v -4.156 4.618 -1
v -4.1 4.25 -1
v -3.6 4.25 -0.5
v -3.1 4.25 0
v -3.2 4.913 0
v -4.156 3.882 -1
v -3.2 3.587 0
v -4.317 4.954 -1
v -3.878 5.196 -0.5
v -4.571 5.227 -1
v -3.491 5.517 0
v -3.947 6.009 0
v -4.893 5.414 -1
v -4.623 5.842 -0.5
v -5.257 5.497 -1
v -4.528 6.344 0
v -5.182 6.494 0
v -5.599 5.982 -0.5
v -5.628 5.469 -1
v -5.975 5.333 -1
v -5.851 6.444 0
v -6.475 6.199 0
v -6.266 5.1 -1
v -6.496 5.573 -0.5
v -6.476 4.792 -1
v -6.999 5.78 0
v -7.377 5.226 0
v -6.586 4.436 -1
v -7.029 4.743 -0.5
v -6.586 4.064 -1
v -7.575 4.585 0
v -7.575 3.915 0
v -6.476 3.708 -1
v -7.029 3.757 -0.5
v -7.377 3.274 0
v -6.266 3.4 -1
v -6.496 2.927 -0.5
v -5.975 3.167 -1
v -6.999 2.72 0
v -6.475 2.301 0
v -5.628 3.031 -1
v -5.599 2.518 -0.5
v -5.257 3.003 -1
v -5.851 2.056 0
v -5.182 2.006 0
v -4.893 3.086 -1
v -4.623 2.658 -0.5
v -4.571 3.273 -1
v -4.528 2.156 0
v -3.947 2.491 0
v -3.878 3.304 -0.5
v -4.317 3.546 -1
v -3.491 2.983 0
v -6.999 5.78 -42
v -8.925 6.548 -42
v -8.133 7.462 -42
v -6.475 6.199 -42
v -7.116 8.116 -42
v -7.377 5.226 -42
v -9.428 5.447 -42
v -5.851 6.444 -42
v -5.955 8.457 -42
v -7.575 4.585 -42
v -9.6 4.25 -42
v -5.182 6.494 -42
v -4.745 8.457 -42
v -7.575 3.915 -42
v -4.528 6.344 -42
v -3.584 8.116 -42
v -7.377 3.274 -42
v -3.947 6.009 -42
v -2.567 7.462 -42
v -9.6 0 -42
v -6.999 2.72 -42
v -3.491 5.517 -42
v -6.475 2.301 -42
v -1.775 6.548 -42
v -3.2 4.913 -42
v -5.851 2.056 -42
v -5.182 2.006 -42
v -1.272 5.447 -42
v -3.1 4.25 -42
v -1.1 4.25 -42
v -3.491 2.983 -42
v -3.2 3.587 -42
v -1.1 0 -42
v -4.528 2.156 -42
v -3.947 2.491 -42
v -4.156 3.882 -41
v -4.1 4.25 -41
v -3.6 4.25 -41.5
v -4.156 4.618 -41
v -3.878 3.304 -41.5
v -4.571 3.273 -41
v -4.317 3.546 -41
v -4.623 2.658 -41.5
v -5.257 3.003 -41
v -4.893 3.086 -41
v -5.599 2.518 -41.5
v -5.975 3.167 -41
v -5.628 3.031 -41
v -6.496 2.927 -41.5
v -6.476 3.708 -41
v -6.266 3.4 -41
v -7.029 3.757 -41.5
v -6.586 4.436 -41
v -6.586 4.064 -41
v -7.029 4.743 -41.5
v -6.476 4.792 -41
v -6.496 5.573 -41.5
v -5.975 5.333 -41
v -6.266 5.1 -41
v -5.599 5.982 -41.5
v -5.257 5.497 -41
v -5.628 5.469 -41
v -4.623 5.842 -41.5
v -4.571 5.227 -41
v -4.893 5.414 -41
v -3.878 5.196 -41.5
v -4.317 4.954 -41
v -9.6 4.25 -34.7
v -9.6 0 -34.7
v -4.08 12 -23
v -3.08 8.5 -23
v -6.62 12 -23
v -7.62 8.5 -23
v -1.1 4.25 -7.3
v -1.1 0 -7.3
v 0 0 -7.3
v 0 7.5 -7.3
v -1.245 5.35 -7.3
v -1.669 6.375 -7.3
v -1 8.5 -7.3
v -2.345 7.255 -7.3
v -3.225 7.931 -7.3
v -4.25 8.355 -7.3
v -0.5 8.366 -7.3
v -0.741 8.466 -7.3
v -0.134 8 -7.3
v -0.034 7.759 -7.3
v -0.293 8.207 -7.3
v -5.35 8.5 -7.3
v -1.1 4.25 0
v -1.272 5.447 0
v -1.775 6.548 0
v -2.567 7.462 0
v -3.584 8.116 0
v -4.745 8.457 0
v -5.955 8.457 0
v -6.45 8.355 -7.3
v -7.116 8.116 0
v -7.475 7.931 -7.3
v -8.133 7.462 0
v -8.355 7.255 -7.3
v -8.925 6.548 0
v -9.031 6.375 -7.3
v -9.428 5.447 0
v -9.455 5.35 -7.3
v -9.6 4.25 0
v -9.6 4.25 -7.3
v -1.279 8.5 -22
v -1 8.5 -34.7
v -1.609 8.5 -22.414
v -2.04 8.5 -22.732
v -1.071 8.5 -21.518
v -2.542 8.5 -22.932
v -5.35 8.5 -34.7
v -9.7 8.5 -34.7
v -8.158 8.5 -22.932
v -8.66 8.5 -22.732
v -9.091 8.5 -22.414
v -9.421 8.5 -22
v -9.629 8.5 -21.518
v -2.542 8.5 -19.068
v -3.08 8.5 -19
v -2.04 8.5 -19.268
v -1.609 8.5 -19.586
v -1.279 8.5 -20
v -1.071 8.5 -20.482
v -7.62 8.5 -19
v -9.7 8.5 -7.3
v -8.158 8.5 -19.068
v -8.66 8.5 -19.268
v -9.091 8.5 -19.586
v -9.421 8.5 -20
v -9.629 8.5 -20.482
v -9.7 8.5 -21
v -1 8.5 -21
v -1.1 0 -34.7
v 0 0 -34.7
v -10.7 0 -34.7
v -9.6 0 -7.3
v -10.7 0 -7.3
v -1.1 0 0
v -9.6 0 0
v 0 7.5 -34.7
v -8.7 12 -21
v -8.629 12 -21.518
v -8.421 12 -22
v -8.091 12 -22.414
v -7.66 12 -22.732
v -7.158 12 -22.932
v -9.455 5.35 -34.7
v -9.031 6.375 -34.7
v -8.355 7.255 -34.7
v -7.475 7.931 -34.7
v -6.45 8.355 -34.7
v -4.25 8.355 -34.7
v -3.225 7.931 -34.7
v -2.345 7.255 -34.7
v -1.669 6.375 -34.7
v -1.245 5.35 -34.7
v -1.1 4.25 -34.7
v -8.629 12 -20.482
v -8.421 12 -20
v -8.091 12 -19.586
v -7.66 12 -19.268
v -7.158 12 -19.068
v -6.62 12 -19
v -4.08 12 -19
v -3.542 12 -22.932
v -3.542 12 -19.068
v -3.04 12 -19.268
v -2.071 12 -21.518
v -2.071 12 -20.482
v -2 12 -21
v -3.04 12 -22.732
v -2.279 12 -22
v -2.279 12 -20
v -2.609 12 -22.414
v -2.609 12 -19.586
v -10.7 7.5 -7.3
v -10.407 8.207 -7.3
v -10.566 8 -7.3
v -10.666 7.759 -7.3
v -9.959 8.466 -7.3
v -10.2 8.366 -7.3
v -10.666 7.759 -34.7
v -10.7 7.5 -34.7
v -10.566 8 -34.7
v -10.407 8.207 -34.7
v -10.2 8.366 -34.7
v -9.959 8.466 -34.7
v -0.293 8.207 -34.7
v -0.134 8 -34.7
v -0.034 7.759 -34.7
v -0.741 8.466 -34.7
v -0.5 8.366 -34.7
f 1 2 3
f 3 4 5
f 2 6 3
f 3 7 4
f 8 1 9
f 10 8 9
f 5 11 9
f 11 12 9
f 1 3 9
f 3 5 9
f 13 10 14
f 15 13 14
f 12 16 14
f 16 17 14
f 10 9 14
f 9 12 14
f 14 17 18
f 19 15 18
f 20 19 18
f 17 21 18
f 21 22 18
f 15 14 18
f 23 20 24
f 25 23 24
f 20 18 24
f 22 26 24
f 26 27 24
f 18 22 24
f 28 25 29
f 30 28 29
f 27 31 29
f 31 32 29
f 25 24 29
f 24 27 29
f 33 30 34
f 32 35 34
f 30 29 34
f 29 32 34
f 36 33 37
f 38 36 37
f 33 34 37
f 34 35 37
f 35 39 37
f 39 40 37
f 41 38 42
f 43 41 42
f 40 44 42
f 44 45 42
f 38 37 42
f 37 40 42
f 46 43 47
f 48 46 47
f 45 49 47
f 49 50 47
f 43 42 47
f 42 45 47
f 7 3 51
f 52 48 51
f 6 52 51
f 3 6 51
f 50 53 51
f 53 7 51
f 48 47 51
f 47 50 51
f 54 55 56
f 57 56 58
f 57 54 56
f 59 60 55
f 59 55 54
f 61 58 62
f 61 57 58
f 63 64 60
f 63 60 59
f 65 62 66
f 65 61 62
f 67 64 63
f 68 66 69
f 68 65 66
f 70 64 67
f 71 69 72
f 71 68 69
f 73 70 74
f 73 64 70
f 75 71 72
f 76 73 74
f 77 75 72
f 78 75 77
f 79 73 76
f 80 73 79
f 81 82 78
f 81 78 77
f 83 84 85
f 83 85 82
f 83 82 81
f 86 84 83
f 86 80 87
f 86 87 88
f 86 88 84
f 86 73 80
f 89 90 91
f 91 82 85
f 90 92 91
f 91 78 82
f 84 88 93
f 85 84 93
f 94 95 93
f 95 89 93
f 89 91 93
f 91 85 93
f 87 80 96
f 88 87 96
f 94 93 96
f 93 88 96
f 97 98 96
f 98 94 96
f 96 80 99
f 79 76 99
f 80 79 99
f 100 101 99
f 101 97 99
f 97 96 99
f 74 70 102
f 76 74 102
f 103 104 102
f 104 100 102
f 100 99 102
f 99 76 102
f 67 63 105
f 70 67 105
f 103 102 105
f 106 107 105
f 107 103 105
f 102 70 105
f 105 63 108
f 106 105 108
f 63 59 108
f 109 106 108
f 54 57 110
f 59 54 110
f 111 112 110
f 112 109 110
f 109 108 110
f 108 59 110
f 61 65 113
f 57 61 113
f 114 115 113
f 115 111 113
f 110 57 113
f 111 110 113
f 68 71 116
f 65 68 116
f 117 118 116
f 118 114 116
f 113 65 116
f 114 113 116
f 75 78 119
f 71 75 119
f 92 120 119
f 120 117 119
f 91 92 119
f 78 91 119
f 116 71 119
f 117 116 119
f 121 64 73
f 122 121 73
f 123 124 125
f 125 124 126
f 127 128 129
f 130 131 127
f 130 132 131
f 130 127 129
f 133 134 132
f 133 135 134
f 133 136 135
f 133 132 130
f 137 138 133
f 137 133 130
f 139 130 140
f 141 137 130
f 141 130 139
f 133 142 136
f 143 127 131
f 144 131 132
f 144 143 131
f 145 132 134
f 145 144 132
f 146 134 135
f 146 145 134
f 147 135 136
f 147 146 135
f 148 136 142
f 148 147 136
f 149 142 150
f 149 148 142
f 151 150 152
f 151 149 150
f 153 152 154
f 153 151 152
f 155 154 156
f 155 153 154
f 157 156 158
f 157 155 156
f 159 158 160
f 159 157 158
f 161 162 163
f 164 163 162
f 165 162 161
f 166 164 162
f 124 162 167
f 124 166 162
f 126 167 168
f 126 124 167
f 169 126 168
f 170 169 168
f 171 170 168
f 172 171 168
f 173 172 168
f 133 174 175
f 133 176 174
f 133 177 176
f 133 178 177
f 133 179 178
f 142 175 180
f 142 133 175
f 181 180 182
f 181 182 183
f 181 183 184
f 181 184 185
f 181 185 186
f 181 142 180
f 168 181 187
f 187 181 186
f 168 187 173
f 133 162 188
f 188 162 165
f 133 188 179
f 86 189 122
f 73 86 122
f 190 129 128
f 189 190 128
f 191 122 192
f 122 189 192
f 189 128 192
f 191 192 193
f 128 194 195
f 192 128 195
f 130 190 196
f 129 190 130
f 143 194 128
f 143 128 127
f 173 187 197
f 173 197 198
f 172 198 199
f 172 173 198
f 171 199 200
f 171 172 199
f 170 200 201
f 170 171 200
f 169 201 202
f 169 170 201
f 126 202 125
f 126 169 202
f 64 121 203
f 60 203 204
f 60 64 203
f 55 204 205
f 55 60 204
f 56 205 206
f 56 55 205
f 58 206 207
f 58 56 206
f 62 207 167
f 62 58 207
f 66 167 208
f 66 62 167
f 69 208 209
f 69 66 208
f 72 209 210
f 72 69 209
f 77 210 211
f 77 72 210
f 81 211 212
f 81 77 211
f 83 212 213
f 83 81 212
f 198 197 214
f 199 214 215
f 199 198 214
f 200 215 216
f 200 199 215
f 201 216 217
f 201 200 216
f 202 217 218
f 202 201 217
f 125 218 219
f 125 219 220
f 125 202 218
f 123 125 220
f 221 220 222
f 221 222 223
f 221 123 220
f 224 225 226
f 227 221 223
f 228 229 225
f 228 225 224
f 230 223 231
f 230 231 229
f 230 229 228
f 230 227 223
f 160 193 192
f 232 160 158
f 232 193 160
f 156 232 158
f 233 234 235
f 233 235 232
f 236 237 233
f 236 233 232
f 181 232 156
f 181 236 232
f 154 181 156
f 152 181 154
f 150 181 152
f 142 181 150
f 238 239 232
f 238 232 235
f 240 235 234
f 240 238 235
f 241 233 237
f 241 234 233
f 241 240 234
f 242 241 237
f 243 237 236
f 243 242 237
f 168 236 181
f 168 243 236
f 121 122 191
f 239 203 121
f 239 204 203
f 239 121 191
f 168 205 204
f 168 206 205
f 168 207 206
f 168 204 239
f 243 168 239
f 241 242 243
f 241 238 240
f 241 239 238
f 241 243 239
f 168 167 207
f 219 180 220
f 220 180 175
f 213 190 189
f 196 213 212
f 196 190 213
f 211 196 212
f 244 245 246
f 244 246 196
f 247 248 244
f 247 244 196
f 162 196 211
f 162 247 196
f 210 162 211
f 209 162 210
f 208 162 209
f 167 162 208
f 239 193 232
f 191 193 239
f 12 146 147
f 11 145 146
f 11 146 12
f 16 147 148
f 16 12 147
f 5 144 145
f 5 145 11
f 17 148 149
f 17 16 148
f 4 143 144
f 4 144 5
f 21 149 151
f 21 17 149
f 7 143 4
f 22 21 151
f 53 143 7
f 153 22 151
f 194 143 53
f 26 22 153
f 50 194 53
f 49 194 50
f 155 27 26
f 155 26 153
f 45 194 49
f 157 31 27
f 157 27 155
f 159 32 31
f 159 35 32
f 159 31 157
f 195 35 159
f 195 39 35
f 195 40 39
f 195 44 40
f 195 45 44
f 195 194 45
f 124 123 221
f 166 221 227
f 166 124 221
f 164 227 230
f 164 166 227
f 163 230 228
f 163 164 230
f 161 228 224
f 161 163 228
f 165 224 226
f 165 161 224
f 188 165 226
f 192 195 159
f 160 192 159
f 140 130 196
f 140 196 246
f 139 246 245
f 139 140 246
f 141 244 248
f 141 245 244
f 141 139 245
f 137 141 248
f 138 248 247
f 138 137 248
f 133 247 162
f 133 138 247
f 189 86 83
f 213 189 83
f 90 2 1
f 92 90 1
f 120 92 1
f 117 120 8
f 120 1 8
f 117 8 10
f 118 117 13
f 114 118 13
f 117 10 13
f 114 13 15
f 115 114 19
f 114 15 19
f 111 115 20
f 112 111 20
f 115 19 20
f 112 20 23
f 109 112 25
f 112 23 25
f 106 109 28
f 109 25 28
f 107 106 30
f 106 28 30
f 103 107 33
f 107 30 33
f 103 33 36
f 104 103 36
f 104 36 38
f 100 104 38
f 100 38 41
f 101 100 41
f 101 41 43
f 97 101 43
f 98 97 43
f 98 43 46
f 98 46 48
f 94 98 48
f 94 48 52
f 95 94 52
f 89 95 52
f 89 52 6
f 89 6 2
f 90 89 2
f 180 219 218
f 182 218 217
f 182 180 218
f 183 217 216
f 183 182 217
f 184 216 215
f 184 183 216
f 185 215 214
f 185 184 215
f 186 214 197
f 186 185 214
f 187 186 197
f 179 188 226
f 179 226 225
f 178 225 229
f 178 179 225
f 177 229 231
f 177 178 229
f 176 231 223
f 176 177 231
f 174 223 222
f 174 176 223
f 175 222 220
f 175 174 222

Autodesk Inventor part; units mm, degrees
ref_plane "YZ Plane" through (0, 0, 0) normal (1, 0, 0) x (0, 1, 0)
ref_plane "XZ Plane" through (0, 0, 0) normal (0, 1, 0) x (-1, 0, 0)
ref_plane "XY Plane" through (0, 0, 0) normal (0, 0, 1) x (1, 0, 0)
sketch "Sketch1" plane through (0, 0, 0) normal (0, 1, 0) x (-1, 0, 0)
  line L0 (0, 0) -> (10.7, 0)
  line L1 (10.7, 0) -> (10.7, -42)
  line L2 (10.7, -42) -> (0, -42)
  line L3 (0, -42) -> (0, 0)
  dimension "p" = 10.7
  dimension "d1" = 42
extrude "Extrusion1" add sketch "Sketch1" along normal blind 8.5
sketch "Sketch2" plane through (-10.7, 0, 0) normal (0, 0, 1) x (1, 0, 0)
  circle A0 centre (5.35, 4.25) radius 1.25
  line L0 (0, 8.5) -> (10.7, 8.5) projected
  line L1 (0, 0) -> (0, 8.5) projected
  point P0 (10.7, 0)
  dimension "d4" = 2.5
  dimension "d5" = 4.25
  dimension "d6" = 5.35
extrude "Extrusion2" cut sketch "Sketch2" against normal through all
sketch "Sketch3" plane through (-10.7, 0, 0) normal (0, 0, 1) x (1, 0, 0)
  circle A0 centre (5.35, 4.25) radius 1.25 projected
  arc A1 (9.6, 4.25) -> (1.1, 4.25) centre (5.35, 4.25) ccw
  line L0 (10.7, 8.5) -> (0, 8.5) projected
  line L1 (0, 8.5) -> (10.7, 8.5)
  line L2 (10.7, 0) -> (10.7, 8.5) projected
  line L3 (10.7, 8.5) -> (10.7, 0)
  line L4 (0, 0) -> (10.7, 0) projected
  line L5 (10.7, 0) -> (0, 0)
  line L6 (0, 0) -> (0, 8.5) projected
  line L7 (0, 0) -> (0, 8.5)
  line L8 (10.7, 0) -> (0, 0) projected
  line L9 (5.35, 0) -> (1.1, 0)
  line L10 (1.1, 0) -> (1.1, 4.25)
  line L11 (5.35, 0) -> (9.6, 0)
  line L12 (9.6, 0) -> (9.6, 4.25)
  dimension "d35" = 4.25
  dimension "d36" = 4.25
  dimension "d37" = 4.25
extrude "Extrusion3" cut sketch "Sketch3" against normal blind 7.3 contours A1 L0 L2 L4 L12 | A1 L10 L4 L6 L0
sketch "Sketch4" plane through (0, 0, -42) normal (0, 0, -1) x (-1, 0, 0)
  circle A0 centre (5.35, 4.25) radius 1.25 projected
  arc A1 (9.6, 4.25) -> (1.1, 4.25) centre (5.35, 4.25) ccw
  line L0 (0, 8.5) -> (10.7, 8.5) projected
  line L1 (10.7, 0) -> (0, 0) projected
  line L2 (0, 8.5) -> (0, 0)
  line L3 (0, 0) -> (10.7, 0)
  line L4 (10.7, 0) -> (10.7, 8.5)
  line L5 (10.7, 8.5) -> (0, 8.5)
  line L6 (1.1, 0) -> (1.1, 4.25) projected
  line L7 (1.1, 4.25) -> (1.1, 0)
  line L8 (9.6, 4.25) -> (9.6, 0) projected
  line L9 (1.1, 0) -> (9.6, 0) projected
  line L10 (9.6, 4.25) -> (9.6, 0)
extrude "Extrusion4" cut sketch "Sketch4" against normal blind 7.3 contours A1 L0 L4 L1 L8 | A1 L6 L1 L2 L0
sketch "Sketch5" plane through (0, 8.5, 0) normal (0, 1, 0) x (1, 0, 0)
  line L0 (-10.7, 7.3) -> (-10.7, 34.7) projected
  line L1 (0, 34.7) -> (0, 7.3) projected
  line L2 (-1, 23) -> (-9.7, 23)
  line L3 (-9.7, 19) -> (-1, 19)
  line L4 (-9.7, 19) -> (-9.7, 23)
  line L5 (-1, 19) -> (-1, 23)
  point P0 (0, 0)
  dimension "d19" = 4
  dimension "d20" = 4
  dimension "d21" = 8.7
  dimension "d22" = 1
  dimension "d23" = 19
extrude "Extrusion5" add sketch "Sketch5" along normal blind 3.5
sketch "Sketch6" plane through (-1, 8.5, -23) normal (0, 0, -1) x (-1, 0, 0)
  line L0 (8.7, 3.5) -> (0, 3.5) projected
  line L1 (8.7, 3.5) -> (7.7, 3.5)
  line L2 (0, 0) -> (8.7, 0) projected
  line L3 (7.7, 3.5) -> (8.7, 0)
  line L4 (8.7, 0) -> (8.7, 3.5)
  line L5 (0, 3.5) -> (1, 3.5)
  line L6 (1, 3.5) -> (0, 0)
  line L7 (0, 0) -> (0, 3.5)
  point P0 (-1, -8.5)
  dimension "d26" = 1
  dimension "d27" = 1
extrude "Extrusion6" cut sketch "Sketch6" against normal through all contours L4 L3 L0 | L6 L7 L0
fillet "Fillet1" radius 2 4 edges at (-1.5, 10.25, -19) (-1.5, 10.25, -23) (-9.2, 10.25, -19) (-9.2, 10.25, -23)
fillet "Fillet2" radius 1 2 edges at (0, 8.5, -21) (-10.7, 8.5, -21)
chamfer "Chamfer1" distance 1 angle 45 2 edges at (-6.6, 4.25, -42) (-6.6, 4.25, 0)
equation "\"d6\" = 0.5 * p"
properties part number "tracks_center_sod_ii"
